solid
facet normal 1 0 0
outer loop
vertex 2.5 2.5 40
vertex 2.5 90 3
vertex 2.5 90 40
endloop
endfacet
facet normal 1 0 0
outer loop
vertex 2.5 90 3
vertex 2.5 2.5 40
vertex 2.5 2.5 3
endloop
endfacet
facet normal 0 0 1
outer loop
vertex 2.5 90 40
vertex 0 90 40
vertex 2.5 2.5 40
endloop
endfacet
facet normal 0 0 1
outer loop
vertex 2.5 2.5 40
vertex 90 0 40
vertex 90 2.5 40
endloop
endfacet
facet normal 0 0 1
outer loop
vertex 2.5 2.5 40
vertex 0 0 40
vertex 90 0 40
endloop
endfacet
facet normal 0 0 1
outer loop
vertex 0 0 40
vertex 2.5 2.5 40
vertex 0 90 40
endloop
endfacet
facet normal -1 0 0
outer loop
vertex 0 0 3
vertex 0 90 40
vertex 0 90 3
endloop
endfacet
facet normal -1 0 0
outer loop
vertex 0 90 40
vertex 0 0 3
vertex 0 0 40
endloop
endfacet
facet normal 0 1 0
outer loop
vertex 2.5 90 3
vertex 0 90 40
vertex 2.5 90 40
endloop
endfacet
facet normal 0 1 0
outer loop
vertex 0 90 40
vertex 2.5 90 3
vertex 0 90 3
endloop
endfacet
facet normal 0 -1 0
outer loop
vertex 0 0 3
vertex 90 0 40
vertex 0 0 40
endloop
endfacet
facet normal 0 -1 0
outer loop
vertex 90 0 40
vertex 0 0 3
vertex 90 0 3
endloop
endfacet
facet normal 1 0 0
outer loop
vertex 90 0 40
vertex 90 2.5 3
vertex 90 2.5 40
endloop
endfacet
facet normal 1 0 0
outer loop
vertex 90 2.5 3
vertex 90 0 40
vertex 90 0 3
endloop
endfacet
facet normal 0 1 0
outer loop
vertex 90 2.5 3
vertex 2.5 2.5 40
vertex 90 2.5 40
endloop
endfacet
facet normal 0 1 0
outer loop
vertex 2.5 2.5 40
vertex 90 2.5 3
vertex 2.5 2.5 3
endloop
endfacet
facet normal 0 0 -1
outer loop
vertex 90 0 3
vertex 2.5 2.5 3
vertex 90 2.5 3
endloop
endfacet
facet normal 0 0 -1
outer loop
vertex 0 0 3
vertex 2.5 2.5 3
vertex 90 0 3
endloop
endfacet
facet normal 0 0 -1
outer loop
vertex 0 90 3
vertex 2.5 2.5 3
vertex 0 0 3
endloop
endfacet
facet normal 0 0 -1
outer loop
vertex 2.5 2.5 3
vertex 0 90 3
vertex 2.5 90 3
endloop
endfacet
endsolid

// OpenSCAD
// Fan box - a top plate and four walls, open at the top, to house a PC case fan as a
// magnetic stirrer. NOVEL general part.
//

top     = 90;
length  = 90;
height  = 40;
wall    = 2.5;
screw   = 4.5;
cable   = 12;

$fn = 48;

plate_t = 2;

difference() {
    union() {
        cube([top, length, plate_t]);
        for (x = [-(length / 2 - wall / 2), length / 2 - wall / 2])
            cube([wall, length, height], p = [x, 0, 0]);
        for (y = [-(top / 2 - wall / 2), top / 2 - wall / 2])
            cube([length, wall, height], p = [0, y, 0]);
    }
    translate([0, 0, -1]) cube([top, length, plate_t + 2]);                 // clear the top plate
    for (x = [-71.5 / 2, 71.5 / 2], y = [-71.5 / 2, 71.5 / 2])
        translate([x, y, -1]) cylinder(h = plate_t + 2, d = screw);           // screw holes
    // one cable notch in a wall, reaching 8 mm down from the open edge (z = height - 8)
    translate([-(length / 2 - wall / 2), 0, height - 8])
        cube([wall, cable, 8]);
}
